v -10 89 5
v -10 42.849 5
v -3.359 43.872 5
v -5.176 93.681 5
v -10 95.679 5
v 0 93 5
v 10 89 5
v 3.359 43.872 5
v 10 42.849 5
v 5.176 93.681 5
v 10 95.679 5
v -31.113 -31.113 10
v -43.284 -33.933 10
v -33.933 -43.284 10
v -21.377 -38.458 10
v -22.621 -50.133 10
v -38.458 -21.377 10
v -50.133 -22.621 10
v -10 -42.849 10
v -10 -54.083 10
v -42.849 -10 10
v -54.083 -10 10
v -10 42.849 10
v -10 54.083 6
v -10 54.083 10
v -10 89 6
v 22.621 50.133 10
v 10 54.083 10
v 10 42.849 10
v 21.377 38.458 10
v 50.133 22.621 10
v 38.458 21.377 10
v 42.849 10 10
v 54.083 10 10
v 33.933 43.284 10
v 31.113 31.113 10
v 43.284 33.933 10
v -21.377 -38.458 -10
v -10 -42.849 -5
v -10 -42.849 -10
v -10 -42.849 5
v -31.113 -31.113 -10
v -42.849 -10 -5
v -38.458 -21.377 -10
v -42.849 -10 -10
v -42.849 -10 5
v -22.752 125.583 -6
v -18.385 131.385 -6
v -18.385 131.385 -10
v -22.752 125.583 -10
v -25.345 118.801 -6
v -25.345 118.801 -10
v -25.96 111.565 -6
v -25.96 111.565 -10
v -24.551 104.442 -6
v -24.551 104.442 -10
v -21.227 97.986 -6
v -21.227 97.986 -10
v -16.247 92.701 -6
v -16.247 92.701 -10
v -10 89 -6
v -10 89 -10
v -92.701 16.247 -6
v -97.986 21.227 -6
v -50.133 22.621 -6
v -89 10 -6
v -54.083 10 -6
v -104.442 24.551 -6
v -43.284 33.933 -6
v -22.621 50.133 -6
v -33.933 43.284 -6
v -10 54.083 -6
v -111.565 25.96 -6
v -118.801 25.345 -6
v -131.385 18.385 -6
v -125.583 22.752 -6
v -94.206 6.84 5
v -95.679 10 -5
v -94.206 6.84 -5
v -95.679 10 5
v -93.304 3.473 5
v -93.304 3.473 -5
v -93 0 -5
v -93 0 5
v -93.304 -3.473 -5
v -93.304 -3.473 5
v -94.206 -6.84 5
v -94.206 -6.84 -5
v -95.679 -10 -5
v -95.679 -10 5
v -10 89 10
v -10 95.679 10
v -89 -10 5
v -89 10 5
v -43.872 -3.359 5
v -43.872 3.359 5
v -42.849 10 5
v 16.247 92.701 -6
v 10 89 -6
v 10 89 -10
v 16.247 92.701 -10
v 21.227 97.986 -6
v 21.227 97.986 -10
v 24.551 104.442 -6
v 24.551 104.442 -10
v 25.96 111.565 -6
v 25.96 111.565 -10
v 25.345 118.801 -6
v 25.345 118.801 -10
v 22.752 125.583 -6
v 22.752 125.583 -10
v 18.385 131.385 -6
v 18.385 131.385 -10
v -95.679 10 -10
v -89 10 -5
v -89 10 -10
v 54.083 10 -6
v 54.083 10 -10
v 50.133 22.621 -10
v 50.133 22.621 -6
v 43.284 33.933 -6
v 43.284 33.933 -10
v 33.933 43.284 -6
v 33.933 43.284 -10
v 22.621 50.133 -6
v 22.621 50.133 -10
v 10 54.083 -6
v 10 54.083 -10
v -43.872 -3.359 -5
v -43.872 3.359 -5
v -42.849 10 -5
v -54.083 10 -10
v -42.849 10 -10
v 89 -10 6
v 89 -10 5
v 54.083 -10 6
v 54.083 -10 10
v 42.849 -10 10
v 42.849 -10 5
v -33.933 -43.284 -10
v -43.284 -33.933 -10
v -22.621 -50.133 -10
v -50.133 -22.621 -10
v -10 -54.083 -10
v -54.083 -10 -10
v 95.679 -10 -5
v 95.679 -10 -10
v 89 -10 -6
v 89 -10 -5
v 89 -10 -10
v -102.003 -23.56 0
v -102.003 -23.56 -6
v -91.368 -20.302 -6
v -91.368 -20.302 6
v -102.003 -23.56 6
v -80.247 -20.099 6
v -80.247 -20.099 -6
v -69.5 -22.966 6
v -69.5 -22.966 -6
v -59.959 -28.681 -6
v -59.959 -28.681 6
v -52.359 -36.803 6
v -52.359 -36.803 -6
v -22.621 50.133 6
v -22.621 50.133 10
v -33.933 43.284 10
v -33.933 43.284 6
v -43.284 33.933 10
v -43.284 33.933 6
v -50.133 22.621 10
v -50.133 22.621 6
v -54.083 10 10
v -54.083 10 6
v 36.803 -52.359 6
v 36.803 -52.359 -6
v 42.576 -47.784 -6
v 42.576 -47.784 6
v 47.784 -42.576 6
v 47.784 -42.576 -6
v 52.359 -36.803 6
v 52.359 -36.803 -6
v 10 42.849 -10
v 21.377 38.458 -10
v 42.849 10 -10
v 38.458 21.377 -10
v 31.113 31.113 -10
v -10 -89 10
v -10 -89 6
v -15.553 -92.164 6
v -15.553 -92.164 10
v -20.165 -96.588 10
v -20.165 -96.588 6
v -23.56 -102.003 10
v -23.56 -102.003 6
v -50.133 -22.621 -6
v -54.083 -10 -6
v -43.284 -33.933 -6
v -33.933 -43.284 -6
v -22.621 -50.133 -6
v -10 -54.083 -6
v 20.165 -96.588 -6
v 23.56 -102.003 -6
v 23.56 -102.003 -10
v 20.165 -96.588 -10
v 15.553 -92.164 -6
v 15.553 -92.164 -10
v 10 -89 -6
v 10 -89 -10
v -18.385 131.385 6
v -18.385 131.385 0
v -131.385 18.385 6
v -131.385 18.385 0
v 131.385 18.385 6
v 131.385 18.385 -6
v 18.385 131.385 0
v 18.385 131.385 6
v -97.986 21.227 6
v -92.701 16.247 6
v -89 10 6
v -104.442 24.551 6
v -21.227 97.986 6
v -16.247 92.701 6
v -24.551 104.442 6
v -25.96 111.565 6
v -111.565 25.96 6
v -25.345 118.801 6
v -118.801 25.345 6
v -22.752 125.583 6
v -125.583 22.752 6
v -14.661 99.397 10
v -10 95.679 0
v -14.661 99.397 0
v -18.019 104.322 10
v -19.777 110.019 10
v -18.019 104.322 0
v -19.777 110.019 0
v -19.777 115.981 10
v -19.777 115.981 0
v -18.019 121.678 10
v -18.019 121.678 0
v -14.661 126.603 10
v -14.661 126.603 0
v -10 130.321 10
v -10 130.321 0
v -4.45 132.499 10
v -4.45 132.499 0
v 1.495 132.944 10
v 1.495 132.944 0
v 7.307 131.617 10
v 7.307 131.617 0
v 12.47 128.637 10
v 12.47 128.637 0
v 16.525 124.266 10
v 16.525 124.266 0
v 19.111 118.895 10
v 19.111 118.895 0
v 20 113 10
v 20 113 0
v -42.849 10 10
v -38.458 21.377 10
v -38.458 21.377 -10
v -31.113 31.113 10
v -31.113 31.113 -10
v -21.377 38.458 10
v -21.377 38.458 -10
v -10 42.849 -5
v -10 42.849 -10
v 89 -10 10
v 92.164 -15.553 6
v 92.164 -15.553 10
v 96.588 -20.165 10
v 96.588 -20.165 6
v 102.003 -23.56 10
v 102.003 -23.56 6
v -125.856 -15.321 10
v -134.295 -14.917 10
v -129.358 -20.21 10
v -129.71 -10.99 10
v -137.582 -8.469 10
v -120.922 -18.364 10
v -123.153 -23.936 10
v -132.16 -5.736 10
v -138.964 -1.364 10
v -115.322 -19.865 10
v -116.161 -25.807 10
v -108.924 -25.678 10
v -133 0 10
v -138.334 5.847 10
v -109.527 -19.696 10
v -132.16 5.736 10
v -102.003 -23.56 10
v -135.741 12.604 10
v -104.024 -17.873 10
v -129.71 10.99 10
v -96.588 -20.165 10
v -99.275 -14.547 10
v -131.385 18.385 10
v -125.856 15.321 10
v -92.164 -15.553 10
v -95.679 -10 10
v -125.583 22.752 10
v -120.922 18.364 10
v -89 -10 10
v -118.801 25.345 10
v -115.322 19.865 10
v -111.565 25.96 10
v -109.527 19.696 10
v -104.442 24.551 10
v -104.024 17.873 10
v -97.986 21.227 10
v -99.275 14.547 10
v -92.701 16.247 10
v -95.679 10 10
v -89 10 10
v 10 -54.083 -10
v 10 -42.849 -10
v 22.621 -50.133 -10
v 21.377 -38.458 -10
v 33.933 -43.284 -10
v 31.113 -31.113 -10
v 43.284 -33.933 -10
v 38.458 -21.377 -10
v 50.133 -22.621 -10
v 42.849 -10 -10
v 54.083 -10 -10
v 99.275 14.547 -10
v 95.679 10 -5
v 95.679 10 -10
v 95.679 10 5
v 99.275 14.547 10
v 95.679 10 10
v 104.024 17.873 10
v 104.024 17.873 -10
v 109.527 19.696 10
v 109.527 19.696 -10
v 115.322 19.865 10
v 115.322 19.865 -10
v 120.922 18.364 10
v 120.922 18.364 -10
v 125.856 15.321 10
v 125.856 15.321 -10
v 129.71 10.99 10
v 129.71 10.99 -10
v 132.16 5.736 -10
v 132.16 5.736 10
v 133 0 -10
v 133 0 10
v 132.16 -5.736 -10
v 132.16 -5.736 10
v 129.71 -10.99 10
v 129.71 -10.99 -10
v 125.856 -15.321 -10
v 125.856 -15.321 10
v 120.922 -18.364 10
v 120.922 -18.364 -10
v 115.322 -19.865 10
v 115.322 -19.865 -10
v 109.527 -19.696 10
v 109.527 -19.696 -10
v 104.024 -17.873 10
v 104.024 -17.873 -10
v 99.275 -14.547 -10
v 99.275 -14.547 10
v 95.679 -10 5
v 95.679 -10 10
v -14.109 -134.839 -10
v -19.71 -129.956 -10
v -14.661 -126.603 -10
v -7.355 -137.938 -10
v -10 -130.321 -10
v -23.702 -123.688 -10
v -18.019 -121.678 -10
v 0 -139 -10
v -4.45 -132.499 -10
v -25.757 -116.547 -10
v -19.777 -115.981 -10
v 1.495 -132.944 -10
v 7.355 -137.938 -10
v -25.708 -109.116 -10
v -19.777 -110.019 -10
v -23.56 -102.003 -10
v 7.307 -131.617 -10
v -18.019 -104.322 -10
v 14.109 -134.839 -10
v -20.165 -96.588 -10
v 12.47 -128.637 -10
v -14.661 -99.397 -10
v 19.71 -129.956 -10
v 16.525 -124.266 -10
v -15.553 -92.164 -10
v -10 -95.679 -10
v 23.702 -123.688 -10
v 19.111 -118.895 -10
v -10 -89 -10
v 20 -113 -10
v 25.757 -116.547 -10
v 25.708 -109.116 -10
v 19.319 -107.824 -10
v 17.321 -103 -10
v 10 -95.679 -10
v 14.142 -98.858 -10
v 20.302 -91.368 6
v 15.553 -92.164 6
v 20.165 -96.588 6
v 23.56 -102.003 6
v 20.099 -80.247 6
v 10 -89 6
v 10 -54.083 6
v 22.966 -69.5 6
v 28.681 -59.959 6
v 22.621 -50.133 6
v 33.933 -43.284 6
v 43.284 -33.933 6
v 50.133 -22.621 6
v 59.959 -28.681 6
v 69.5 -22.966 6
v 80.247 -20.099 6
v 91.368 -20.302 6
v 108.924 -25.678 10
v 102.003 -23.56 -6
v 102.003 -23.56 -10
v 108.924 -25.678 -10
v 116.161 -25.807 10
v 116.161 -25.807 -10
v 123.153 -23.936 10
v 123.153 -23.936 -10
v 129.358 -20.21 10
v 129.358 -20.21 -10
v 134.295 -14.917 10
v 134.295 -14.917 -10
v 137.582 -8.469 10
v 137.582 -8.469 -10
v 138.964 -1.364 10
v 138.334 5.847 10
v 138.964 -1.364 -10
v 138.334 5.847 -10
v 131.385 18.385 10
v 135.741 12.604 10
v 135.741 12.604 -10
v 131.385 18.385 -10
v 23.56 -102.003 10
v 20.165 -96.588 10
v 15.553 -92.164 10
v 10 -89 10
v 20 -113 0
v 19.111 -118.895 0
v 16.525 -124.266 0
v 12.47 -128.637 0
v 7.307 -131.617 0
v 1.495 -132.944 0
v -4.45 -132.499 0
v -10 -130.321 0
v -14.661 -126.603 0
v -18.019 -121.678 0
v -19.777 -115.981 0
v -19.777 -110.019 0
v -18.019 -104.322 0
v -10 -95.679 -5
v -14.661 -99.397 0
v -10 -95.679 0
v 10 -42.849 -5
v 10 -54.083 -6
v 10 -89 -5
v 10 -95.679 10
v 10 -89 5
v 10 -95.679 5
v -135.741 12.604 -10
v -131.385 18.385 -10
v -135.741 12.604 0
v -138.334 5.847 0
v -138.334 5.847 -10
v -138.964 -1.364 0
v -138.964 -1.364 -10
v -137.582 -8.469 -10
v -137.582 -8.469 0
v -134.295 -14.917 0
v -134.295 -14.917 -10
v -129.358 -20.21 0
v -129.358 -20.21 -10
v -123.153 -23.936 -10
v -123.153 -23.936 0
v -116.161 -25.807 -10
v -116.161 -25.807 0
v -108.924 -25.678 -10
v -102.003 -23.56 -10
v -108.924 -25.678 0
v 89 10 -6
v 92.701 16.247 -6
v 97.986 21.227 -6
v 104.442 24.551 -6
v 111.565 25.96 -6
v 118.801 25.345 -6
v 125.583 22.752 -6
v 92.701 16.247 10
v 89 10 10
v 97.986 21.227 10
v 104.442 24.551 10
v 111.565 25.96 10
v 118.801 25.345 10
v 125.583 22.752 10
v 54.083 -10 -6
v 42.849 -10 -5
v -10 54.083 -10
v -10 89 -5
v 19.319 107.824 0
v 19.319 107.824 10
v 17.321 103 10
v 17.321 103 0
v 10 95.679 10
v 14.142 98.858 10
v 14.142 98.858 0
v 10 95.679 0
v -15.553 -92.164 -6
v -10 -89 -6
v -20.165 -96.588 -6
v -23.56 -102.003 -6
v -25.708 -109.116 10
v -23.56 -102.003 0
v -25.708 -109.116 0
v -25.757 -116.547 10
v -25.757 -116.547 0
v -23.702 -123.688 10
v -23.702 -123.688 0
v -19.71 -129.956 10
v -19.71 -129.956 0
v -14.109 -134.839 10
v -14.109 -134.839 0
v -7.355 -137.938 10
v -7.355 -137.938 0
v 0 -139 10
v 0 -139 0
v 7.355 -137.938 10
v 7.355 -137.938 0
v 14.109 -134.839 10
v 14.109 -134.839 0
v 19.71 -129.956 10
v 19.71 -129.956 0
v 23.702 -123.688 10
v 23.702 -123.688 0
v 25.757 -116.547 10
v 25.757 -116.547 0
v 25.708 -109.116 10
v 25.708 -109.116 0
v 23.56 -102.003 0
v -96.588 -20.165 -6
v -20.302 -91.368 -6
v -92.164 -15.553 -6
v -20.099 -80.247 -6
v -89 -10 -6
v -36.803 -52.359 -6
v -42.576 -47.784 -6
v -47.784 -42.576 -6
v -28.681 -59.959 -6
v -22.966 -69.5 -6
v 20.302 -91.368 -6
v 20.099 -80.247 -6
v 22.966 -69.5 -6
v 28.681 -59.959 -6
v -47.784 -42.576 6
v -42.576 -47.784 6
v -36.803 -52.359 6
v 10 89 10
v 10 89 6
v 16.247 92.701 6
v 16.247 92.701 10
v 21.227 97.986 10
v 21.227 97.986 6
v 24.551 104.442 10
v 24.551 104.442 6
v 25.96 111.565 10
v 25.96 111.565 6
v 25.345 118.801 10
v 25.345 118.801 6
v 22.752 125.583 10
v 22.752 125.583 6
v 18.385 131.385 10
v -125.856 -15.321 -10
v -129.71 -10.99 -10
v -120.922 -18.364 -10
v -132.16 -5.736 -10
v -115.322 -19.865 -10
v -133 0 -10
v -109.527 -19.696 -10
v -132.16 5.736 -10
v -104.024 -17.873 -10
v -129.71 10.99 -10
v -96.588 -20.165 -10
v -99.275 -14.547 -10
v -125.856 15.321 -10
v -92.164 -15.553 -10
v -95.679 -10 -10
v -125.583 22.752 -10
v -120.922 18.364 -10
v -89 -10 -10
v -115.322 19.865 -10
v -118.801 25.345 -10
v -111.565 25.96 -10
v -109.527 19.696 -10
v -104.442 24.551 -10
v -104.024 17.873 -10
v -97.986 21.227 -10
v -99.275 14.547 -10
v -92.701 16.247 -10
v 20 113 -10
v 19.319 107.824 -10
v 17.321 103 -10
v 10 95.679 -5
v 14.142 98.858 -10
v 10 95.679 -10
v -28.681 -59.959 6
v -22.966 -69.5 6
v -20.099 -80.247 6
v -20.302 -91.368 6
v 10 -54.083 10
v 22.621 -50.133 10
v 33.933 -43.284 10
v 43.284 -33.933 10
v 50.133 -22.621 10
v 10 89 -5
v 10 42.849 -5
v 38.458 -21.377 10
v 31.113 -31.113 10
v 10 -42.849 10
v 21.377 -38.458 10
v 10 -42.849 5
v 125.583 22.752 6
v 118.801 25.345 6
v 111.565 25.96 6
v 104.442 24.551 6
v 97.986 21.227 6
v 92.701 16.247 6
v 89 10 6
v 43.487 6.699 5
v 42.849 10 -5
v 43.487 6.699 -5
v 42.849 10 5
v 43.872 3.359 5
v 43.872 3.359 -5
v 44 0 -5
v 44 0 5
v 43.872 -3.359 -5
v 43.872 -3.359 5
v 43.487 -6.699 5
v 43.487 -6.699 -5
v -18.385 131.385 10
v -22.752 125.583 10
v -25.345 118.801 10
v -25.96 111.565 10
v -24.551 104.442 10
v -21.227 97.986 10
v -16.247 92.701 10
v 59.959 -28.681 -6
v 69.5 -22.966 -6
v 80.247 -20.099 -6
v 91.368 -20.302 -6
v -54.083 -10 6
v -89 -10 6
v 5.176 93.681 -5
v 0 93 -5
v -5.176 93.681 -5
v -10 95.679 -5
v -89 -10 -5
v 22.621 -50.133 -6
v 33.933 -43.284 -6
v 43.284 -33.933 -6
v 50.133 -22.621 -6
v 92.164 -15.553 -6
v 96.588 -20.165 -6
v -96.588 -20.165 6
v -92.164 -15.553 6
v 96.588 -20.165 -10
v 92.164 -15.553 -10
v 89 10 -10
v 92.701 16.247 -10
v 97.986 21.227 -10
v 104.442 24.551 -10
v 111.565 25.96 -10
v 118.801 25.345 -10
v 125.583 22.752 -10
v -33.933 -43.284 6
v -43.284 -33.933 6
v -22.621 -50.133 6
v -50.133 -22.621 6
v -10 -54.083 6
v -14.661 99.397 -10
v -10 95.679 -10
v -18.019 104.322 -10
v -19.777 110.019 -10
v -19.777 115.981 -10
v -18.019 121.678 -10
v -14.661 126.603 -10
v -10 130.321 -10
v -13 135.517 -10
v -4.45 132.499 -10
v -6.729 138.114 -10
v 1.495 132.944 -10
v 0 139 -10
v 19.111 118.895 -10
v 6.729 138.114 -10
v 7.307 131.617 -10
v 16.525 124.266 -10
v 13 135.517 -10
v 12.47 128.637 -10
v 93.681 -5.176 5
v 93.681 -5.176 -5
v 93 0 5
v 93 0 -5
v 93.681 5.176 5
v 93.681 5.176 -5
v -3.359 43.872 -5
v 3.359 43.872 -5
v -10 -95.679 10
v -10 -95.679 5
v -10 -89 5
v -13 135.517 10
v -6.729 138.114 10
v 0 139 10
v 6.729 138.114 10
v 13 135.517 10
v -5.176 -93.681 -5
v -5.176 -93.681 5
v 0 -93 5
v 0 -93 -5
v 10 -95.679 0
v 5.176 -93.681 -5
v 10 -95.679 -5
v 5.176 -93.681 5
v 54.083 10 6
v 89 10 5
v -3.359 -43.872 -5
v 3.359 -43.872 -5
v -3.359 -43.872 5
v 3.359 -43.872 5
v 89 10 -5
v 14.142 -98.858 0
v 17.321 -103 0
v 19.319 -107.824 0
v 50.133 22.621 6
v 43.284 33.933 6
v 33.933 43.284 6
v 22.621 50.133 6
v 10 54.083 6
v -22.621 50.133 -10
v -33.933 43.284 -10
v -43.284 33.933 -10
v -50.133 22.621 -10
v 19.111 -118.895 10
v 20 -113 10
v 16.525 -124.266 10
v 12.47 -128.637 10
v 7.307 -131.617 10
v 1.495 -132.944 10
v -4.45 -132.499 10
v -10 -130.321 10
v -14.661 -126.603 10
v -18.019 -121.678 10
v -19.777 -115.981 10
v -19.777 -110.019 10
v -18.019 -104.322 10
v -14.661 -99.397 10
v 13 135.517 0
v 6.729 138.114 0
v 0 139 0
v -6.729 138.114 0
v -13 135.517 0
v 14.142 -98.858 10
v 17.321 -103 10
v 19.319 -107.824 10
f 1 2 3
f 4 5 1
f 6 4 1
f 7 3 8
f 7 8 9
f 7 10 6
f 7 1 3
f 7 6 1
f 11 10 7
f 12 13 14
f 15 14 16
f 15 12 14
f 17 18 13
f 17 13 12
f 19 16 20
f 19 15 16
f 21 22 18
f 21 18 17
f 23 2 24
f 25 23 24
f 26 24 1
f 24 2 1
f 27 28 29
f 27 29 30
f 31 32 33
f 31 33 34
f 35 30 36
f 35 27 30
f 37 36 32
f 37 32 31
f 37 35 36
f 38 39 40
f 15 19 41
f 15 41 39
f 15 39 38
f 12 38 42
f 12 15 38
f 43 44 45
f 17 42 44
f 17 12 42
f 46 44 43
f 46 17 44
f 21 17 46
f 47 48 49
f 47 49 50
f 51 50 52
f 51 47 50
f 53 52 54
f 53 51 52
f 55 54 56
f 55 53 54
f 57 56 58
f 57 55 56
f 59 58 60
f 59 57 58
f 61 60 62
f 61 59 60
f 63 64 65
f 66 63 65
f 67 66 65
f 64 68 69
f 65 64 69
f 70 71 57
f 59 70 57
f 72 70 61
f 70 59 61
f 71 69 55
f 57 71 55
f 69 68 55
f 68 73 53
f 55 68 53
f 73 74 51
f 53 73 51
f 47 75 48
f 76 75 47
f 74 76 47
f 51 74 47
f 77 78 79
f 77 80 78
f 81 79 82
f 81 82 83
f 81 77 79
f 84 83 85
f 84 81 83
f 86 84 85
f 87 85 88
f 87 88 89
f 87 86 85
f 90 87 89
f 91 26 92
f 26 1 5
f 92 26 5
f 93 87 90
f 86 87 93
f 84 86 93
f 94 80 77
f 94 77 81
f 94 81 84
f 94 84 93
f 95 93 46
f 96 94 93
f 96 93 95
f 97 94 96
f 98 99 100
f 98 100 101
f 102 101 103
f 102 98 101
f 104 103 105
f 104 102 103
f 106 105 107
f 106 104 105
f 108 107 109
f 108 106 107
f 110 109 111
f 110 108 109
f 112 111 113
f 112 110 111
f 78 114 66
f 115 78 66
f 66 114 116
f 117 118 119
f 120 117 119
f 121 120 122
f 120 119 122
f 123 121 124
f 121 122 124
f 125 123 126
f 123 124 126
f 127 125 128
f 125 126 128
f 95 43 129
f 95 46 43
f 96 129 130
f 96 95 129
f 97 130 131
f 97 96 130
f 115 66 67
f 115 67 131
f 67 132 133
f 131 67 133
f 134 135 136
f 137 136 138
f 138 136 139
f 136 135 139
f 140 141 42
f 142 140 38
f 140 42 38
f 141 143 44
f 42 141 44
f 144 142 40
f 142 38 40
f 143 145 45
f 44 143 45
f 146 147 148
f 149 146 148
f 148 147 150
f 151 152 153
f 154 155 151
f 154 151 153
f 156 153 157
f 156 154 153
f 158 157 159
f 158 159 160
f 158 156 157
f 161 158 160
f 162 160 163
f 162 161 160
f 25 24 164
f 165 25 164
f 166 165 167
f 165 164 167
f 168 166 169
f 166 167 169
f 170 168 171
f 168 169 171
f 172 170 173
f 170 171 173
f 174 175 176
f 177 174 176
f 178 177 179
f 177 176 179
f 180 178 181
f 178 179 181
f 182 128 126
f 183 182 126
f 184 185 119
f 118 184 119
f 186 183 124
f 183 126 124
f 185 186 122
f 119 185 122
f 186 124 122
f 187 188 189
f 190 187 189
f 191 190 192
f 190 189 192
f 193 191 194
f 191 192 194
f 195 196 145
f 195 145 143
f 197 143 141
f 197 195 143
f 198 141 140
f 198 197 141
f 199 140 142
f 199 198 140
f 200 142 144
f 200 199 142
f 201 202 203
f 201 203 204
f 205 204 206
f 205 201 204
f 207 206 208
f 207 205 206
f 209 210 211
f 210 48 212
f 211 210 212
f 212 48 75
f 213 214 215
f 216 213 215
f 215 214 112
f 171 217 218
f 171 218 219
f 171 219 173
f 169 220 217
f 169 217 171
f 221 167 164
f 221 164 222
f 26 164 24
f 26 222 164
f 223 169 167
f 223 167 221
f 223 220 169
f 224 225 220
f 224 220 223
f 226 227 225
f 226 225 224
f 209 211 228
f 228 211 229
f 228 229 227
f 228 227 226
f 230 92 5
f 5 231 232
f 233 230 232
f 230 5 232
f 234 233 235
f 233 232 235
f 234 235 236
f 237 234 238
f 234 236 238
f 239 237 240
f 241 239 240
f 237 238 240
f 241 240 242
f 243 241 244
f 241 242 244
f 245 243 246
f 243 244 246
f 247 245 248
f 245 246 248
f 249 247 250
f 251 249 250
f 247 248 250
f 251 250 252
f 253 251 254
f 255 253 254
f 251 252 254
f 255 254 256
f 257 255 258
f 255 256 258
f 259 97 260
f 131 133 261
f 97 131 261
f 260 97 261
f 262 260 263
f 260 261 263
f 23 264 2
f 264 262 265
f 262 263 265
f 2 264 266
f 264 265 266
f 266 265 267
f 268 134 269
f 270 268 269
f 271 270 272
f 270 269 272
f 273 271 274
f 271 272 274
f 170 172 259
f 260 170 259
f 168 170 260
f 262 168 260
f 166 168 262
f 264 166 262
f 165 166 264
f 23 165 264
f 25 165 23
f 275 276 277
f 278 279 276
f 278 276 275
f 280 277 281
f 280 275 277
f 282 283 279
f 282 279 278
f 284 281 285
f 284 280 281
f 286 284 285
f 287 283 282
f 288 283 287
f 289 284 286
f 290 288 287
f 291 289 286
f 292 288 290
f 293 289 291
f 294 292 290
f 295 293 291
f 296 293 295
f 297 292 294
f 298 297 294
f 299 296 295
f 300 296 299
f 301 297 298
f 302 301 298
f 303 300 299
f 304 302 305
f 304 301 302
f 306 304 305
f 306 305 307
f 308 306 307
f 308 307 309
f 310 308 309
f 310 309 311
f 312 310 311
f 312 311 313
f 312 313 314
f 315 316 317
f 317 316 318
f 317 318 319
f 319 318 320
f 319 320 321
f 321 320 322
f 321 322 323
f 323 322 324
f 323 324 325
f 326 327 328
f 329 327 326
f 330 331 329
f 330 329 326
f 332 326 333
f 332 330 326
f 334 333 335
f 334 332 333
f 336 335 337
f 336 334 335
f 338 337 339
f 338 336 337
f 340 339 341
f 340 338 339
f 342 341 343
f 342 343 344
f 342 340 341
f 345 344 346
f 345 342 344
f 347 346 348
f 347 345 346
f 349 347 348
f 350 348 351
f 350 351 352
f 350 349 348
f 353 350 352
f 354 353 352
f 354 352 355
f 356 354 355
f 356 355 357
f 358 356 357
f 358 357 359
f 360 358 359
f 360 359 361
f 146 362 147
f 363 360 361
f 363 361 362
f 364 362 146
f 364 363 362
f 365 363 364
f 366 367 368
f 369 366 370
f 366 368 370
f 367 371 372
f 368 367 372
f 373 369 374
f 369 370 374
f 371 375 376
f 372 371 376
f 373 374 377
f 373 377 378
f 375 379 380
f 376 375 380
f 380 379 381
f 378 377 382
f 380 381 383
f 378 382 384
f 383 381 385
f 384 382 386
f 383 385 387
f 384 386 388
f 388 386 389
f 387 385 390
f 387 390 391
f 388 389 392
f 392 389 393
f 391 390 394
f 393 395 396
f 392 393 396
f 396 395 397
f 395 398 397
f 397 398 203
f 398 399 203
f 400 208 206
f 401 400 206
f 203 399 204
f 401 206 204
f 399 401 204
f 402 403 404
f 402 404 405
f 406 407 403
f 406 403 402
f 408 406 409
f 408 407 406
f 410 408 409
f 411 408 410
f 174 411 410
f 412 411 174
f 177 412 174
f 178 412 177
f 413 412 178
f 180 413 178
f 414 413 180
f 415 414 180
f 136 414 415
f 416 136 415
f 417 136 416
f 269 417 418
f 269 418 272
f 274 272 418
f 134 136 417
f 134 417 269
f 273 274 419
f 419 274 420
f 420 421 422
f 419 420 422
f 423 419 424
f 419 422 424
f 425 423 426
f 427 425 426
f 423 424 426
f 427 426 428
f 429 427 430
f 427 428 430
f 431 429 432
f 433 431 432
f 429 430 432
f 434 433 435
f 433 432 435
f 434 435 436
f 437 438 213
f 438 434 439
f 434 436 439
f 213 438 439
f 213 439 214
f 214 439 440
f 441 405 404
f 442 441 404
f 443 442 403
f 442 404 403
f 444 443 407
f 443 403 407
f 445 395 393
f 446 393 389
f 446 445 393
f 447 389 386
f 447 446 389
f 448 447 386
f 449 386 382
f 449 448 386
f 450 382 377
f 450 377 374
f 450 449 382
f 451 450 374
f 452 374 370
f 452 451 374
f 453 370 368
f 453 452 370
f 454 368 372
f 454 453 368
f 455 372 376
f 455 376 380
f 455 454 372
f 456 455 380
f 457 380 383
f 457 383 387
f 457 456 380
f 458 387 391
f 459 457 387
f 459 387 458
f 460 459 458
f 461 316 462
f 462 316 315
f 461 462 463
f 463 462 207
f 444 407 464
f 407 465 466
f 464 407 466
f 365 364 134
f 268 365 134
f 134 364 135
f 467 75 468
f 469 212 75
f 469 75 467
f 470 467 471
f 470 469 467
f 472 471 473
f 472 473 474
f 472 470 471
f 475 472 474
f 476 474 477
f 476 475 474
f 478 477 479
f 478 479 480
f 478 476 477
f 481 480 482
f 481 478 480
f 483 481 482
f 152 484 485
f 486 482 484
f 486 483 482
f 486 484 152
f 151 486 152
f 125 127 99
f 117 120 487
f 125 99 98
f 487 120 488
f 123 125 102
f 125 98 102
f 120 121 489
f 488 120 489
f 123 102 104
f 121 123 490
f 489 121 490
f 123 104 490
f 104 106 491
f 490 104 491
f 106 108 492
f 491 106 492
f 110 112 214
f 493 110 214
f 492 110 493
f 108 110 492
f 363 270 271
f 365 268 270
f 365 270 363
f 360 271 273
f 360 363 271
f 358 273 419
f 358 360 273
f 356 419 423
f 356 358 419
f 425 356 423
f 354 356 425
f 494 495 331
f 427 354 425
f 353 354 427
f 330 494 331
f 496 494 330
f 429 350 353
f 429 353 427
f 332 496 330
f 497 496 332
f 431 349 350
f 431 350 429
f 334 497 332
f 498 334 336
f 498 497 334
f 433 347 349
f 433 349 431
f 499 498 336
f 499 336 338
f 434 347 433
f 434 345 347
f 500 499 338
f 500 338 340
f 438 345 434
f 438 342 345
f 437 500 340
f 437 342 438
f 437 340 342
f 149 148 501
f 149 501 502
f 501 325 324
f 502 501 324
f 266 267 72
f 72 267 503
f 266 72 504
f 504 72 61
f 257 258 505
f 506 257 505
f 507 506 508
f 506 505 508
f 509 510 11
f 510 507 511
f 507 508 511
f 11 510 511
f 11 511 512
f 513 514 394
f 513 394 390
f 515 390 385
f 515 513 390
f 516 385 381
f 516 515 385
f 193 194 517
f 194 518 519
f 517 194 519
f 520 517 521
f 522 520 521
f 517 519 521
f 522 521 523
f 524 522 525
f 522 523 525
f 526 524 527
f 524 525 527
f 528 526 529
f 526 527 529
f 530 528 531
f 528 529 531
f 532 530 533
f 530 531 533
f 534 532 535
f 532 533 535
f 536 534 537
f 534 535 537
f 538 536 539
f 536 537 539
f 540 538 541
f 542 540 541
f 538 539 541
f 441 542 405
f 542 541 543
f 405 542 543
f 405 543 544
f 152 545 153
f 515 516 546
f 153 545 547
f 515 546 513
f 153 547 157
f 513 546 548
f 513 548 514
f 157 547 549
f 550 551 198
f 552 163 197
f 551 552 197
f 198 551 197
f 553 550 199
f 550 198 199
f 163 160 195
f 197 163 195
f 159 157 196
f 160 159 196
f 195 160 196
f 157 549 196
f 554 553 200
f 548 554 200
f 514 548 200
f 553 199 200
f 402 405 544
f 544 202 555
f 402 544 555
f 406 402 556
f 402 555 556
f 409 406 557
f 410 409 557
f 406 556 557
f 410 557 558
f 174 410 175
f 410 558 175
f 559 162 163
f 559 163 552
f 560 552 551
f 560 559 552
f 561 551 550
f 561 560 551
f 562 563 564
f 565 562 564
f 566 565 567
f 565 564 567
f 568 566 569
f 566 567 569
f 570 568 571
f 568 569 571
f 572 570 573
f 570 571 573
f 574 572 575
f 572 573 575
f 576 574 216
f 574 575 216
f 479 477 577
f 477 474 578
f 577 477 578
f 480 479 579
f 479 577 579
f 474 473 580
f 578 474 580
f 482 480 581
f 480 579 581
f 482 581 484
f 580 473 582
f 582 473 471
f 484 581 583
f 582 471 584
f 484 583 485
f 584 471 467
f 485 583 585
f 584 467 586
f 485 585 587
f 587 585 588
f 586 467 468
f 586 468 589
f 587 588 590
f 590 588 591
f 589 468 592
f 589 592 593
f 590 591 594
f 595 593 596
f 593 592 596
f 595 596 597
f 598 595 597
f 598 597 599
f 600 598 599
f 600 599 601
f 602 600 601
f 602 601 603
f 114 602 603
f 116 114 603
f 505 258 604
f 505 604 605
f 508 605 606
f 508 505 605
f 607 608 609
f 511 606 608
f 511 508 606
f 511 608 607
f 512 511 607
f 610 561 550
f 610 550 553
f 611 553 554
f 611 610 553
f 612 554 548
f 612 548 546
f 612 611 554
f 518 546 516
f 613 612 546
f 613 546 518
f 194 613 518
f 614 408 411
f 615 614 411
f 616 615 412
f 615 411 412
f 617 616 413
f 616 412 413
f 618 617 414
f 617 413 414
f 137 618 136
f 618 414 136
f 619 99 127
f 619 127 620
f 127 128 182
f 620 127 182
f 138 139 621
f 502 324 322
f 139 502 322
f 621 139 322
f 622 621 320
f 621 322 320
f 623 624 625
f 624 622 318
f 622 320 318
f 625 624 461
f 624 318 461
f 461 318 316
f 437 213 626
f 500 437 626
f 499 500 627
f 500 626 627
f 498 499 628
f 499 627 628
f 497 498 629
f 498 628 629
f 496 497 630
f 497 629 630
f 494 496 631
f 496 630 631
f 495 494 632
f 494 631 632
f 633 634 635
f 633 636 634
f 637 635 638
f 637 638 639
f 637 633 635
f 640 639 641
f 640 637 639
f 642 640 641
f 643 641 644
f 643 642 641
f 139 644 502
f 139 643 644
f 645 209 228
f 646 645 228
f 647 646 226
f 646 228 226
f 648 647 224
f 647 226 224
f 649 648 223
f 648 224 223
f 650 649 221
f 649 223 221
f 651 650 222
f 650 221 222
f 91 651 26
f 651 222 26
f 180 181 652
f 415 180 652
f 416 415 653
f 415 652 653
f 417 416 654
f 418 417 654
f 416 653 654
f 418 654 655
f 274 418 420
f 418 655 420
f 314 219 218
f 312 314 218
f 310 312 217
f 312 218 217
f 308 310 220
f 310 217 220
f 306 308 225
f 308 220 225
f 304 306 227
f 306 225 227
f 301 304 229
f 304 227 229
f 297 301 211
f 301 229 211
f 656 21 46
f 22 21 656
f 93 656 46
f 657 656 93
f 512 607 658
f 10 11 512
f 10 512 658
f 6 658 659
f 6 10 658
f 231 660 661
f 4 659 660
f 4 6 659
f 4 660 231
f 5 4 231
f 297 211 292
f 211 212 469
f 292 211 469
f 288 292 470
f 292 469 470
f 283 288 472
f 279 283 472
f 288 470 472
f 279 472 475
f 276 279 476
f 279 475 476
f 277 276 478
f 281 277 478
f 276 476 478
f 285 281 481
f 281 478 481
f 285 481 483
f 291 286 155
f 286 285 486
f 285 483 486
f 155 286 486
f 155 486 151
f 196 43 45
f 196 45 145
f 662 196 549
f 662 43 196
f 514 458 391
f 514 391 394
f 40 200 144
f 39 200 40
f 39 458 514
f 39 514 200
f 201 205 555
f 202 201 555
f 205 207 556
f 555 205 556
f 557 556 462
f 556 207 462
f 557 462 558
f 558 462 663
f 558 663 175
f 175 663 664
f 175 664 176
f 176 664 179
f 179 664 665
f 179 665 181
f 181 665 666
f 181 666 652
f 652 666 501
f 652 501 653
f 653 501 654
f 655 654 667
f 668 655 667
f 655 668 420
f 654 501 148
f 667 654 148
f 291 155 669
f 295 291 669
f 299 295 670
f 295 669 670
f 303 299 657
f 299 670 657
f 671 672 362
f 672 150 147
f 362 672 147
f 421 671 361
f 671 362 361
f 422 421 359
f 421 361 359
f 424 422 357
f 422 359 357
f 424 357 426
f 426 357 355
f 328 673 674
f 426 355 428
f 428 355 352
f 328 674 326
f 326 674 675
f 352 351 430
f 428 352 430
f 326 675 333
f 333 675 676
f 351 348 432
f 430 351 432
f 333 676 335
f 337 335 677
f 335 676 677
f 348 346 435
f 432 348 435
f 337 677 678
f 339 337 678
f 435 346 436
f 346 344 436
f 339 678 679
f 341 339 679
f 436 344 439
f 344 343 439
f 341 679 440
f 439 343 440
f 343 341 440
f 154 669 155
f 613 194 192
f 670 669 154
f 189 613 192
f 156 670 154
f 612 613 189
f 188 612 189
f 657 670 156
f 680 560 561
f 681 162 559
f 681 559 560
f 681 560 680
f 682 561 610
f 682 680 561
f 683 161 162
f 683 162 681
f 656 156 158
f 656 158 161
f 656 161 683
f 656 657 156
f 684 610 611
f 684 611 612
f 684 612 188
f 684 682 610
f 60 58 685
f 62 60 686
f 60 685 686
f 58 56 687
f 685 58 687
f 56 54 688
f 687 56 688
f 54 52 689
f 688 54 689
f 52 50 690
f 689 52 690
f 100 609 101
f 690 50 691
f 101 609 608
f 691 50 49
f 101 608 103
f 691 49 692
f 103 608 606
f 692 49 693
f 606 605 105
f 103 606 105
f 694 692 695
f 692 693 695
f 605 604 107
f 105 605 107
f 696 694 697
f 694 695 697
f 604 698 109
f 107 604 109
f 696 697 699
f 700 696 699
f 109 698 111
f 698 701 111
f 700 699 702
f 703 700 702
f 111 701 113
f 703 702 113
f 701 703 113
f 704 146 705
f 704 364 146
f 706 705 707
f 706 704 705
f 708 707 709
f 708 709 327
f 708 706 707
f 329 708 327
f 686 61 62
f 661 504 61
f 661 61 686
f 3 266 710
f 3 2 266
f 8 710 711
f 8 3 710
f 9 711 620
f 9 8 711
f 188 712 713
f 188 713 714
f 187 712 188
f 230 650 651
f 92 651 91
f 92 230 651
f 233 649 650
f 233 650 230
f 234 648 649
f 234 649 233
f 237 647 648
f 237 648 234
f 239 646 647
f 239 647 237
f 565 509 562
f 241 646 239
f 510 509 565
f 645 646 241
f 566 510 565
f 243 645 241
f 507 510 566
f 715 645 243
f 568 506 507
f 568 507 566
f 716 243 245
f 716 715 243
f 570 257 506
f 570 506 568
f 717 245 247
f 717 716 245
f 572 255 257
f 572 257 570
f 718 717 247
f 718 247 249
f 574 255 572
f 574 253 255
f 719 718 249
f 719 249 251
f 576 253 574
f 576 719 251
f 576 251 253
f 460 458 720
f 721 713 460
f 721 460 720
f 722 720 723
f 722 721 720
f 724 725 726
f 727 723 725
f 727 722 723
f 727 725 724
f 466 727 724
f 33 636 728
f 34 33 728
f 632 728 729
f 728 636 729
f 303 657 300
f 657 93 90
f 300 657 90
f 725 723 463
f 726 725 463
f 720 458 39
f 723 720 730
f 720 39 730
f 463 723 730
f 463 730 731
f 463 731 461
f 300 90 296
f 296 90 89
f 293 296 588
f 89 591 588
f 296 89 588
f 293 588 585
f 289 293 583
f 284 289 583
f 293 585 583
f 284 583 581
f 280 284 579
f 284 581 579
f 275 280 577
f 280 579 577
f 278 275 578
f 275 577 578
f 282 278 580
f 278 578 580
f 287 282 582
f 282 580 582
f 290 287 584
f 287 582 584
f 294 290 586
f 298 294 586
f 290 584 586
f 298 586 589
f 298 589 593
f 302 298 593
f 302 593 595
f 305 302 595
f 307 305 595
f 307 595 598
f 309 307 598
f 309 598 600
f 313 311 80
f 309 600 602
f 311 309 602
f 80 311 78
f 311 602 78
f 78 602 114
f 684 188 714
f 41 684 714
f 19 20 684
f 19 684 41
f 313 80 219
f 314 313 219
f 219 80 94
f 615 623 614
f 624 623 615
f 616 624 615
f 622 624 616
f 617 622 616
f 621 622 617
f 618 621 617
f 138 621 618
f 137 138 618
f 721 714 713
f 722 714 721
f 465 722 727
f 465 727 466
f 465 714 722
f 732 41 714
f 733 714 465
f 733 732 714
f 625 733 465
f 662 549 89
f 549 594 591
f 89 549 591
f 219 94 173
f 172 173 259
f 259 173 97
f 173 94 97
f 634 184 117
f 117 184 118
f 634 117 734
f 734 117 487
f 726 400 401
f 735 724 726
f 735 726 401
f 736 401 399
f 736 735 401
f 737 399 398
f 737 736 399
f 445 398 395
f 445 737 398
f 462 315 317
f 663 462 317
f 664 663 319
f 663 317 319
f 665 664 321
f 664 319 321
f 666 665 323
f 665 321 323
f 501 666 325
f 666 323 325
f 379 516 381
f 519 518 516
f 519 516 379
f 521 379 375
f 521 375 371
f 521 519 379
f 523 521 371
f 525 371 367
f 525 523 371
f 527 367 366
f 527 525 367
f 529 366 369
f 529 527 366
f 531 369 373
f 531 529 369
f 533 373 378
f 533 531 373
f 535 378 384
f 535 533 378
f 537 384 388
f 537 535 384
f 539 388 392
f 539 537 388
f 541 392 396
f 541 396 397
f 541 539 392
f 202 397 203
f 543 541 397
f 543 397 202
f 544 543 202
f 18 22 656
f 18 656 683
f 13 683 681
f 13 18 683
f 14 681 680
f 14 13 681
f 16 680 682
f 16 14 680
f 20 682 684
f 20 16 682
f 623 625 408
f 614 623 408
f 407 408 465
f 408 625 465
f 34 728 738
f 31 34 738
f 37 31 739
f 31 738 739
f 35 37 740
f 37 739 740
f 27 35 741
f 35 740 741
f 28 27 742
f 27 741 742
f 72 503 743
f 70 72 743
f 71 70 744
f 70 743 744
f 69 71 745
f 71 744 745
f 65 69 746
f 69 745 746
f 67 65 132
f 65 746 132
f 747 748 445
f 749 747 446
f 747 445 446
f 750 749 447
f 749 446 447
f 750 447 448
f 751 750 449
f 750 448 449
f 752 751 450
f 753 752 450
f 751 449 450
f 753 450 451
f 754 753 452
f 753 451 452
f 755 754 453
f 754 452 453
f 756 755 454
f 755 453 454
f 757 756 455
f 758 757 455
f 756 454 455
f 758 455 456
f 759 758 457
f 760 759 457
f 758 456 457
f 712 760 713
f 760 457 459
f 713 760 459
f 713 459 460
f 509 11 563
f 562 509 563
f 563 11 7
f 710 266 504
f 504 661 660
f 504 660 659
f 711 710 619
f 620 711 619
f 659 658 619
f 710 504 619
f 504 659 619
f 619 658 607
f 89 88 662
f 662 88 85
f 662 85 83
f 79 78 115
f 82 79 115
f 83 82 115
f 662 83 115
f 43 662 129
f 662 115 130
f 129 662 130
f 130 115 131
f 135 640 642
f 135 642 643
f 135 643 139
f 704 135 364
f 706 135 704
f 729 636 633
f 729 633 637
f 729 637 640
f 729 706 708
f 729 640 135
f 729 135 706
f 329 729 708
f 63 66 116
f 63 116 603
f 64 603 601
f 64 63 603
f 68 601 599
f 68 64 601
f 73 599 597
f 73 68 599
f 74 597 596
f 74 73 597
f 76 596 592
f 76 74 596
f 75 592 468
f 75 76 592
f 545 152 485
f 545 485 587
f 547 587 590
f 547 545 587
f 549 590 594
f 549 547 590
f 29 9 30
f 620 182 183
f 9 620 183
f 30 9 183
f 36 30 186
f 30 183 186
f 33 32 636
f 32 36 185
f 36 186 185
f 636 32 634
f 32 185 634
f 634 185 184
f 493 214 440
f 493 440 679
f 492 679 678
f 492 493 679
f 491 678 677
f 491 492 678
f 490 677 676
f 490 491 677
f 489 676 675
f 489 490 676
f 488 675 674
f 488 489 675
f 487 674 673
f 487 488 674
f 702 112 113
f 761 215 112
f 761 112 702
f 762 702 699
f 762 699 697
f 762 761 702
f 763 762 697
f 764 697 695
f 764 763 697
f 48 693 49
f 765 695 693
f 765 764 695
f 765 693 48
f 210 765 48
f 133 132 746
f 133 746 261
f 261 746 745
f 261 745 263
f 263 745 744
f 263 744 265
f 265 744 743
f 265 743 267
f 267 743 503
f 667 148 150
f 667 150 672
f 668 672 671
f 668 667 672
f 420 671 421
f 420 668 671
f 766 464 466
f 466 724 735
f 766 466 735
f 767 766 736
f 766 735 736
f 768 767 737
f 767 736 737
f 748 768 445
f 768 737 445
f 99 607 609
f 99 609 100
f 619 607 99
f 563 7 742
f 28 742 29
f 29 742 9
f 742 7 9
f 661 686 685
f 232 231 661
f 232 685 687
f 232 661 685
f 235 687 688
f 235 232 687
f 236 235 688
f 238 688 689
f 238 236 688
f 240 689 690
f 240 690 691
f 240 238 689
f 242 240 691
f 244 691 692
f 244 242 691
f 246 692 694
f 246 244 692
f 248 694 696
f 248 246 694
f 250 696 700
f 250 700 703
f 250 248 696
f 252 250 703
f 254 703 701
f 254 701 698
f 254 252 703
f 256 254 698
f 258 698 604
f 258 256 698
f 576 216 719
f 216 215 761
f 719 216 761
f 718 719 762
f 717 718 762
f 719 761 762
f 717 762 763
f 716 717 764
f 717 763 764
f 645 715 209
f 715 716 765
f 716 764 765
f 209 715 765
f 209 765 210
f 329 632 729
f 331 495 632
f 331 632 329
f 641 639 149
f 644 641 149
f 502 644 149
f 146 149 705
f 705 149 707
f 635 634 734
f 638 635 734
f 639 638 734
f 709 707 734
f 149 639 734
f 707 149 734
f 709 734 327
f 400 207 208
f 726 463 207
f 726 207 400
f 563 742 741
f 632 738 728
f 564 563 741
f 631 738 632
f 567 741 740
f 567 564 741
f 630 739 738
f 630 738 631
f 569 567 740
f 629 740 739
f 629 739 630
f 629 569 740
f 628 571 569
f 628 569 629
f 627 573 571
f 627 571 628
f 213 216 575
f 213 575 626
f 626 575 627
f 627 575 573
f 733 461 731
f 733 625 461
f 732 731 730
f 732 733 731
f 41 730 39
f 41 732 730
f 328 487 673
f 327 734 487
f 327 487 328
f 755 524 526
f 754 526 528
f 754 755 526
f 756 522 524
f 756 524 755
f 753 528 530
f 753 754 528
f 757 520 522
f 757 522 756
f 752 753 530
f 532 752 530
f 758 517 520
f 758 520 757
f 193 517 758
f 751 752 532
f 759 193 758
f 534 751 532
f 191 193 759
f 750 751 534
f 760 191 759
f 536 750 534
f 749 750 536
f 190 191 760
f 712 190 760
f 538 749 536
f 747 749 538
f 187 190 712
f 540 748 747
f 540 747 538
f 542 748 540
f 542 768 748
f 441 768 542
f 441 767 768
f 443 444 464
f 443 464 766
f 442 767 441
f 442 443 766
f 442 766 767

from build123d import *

# Parameters (mm, degrees)
BOSS_EXTRUDE1_DEPTH   = 5
BOSS_EXTRUDE1_2_DEPTH = 5
BOSS_EXTRUDE1_3_DEPTH = 5
BOSS_EXTRUDE1_4_DEPTH = 5
BOSS_EXTRUDE2_DEPTH   = 10
BOSS_EXTRUDE3_DEPTH   = 6
BOSS_EXTRUDE4_DEPTH   = 10


with BuildPart() as part:
    # Sketch1 → Boss-Extrude1 (new, symmetric)
    with BuildSketch(Plane.XY):
        with BuildLine():
            Line((-42.848570571, 10), (-95.679491924, 10))
            ThreePointArc((-95.679491924, 10), (-93, 0), (-95.679491924, -10))
            Line((-95.679491924, -10), (-42.848570571, -10))
            ThreePointArc((-42.848570571, -10), (-44, 0), (-42.848570571, 10))
        make_face()
    extrude(amount=BOSS_EXTRUDE1_DEPTH, both=True)



with BuildPart() as body_2:
    # Sketch1 → Boss-Extrude1 2 (new, symmetric)
    with BuildSketch(Plane.XY):
        with BuildLine():
            Line((-10, 95.679491924), (-10, 42.848570571))
            ThreePointArc((-10, 42.848570571), (0, 44), (10, 42.848570571))
            Line((10, 42.848570571), (10, 95.679491924))
            ThreePointArc((10, 95.679491924), (0, 93), (-10, 95.679491924))
        make_face()
    extrude(amount=BOSS_EXTRUDE1_2_DEPTH, both=True)


with BuildPart() as body_3:
    # Sketch1 → Boss-Extrude1 3 (new, symmetric)
    with BuildSketch(Plane.XY):
        with BuildLine():
            Line((-10, -42.848570571), (-10, -95.679491924))
            ThreePointArc((-10, -95.679491924), (0, -93), (10, -95.679491924))
            Line((10, -95.679491924), (10, -42.848570571))
            ThreePointArc((10, -42.848570571), (0, -44), (-10, -42.848570571))
        make_face()
    extrude(amount=BOSS_EXTRUDE1_3_DEPTH, both=True)


with BuildPart() as body_4:
    # Sketch1 → Boss-Extrude1 4 (new, symmetric)
    with BuildSketch(Plane.XY):
        with BuildLine():
            Line((95.679491924, 10), (42.848570571, 10))
            ThreePointArc((42.848570571, 10), (44, 0), (42.848570571, -10))
            Line((42.848570571, -10), (95.679491924, -10))
            ThreePointArc((95.679491924, -10), (93, 0), (95.679491924, 10))
        make_face()
    extrude(amount=BOSS_EXTRUDE1_4_DEPTH, both=True)


with BuildPart() as part_1:
    add(part.part)

    add(body_2.part)  # Boss-Extrude2 merges body 2

    add(body_3.part)  # Boss-Extrude2 merges body 3

    add(body_4.part)  # Boss-Extrude2 merges body 4
    # Sketch1<3> → Boss-Extrude2 (add, symmetric)
    with BuildSketch(Plane.XY):
        with BuildLine():
            ThreePointArc((-10, 54.083269132), (-38.890872965, 38.890872965), (-54.083269132, 10))
            Line((-54.083269132, 10), (-42.848570571, 10))
            ThreePointArc((-42.848570571, 10), (-31.112698372, 31.112698372), (-10, 42.848570571))
            Line((-10, 42.848570571), (-10, 54.083269132))
        make_face()
        with BuildLine():
            Line((-42.848570571, -10), (-54.083269132, -10))
            ThreePointArc((-54.083269132, -10), (-38.890872965, -38.890872965), (-10, -54.083269132))
            Line((-10, -54.083269132), (-10, -42.848570571))
            ThreePointArc((-10, -42.848570571), (-31.112698372, -31.112698372), (-42.848570571, -10))
        make_face()
        with BuildLine():
            Line((10, 54.083269132), (10, 42.848570571))
            ThreePointArc((10, 42.848570571), (31.112698372, 31.112698372), (42.848570571, 10))
            Line((42.848570571, 10), (54.083269132, 10))
            ThreePointArc((54.083269132, 10), (38.890872965, 38.890872965), (10, 54.083269132))
        make_face()
        with BuildLine():
            ThreePointArc((42.848570571, -10), (31.112698372, -31.112698372), (10, -42.848570571))
            Line((10, -42.848570571), (10, -54.083269132))
            ThreePointArc((10, -54.083269132), (38.890872965, -38.890872965), (54.083269132, -10))
            Line((54.083269132, -10), (42.848570571, -10))
        make_face()
    extrude(amount=BOSS_EXTRUDE2_DEPTH, both=True)

    # Sketch1<4> → Boss-Extrude3 (add, symmetric)
    with BuildSketch(Plane.XY):
        with BuildLine():
            ThreePointArc((-131.384776311, 18.384776311), (-107.954328319, 25.505709112), (-89, 10))
            Line((-89, 10), (-54.083269132, 10))
            ThreePointArc((-54.083269132, 10), (-38.890872965, 38.890872965), (-10, 54.083269132))
            Line((-10, 54.083269132), (-10, 89))
            ThreePointArc((-10, 89), (-25.505709112, 107.954328319), (-18.384776311, 131.384776311))
            Line((-18.384776311, 131.384776311), (-131.384776311, 18.384776311))
        make_face()
        with BuildLine():
            Line((-54.083269132, -10), (-89, -10))
            ThreePointArc((-89, -10), (-94.233874983, -17.995348061), (-102.002815768, -23.559752524))
            ThreePointArc((-102.002815768, -23.559752524), (-74.773631801, -21.15717706), (-52.359428182, -36.803400392))
            ThreePointArc((-52.359428182, -36.803400392), (-45.254833996, -45.254833996), (-36.803400392, -52.359428182))
            ThreePointArc((-36.803400392, -52.359428182), (-21.15717706, -74.773631801), (-23.559752524, -102.002815768))
            ThreePointArc((-23.559752524, -102.002815768), (-17.995348061, -94.233874983), (-10, -89))
            Line((-10, -89), (-10, -54.083269132))
            ThreePointArc((-10, -54.083269132), (-38.890872965, -38.890872965), (-54.083269132, -10))
        make_face()
        with BuildLine():
            Line((131.384776311, 18.384776311), (18.384776311, 131.384776311))
            ThreePointArc((18.384776311, 131.384776311), (25.505709112, 107.954328319), (10, 89))
            Line((10, 89), (10, 54.083269132))
            ThreePointArc((10, 54.083269132), (38.890872965, 38.890872965), (54.083269132, 10))
            Line((54.083269132, 10), (89, 10))
            ThreePointArc((89, 10), (107.954328319, 25.505709112), (131.384776311, 18.384776311))
        make_face()
        with BuildLine():
            ThreePointArc((52.359428182, -36.803400392), (74.773631801, -21.15717706), (102.002815768, -23.559752524))
            ThreePointArc((102.002815768, -23.559752524), (94.233874983, -17.995348061), (89, -10))
            Line((89, -10), (54.083269132, -10))
            ThreePointArc((54.083269132, -10), (38.890872965, -38.890872965), (10, -54.083269132))
            Line((10, -54.083269132), (10, -89))
            ThreePointArc((10, -89), (17.995348061, -94.233874983), (23.559752524, -102.002815768))
            ThreePointArc((23.559752524, -102.002815768), (21.15717706, -74.773631801), (36.803400392, -52.359428182))
            ThreePointArc((36.803400392, -52.359428182), (45.254833996, -45.254833996), (52.359428182, -36.803400392))
        make_face()
    extrude(amount=BOSS_EXTRUDE3_DEPTH, both=True)

    # Sketch1<5> → Boss-Extrude4 (add, symmetric)
    with BuildSketch(Plane.XY):
        with BuildLine():
            ThreePointArc((-95.679491924, -10), (-133, 0), (-95.679491924, 10))
            Line((-95.679491924, 10), (-89, 10))
            ThreePointArc((-89, 10), (-139, 0), (-89, -10))
            Line((-89, -10), (-95.679491924, -10))
        make_face()
        with BuildLine():
            ThreePointArc((10, 89), (0, 139), (-10, 89))
            Line((-10, 89), (-10, 95.679491924))
            ThreePointArc((-10, 95.679491924), (0, 133), (10, 95.679491924))
            Line((10, 95.679491924), (10, 89))
        make_face()
        with BuildLine():
            ThreePointArc((89, -10), (139, 0), (89, 10))
            Line((89, 10), (95.679491924, 10))
            ThreePointArc((95.679491924, 10), (133, 0), (95.679491924, -10))
            Line((95.679491924, -10), (89, -10))
        make_face()
        with BuildLine():
            Line((-10, -95.679491924), (-10, -89))
            ThreePointArc((-10, -89), (0, -139), (10, -89))
            Line((10, -89), (10, -95.679491924))
            ThreePointArc((10, -95.679491924), (0, -133), (-10, -95.679491924))
        make_face()
    extrude(amount=BOSS_EXTRUDE4_DEPTH, both=True)


solid = part_1.part
